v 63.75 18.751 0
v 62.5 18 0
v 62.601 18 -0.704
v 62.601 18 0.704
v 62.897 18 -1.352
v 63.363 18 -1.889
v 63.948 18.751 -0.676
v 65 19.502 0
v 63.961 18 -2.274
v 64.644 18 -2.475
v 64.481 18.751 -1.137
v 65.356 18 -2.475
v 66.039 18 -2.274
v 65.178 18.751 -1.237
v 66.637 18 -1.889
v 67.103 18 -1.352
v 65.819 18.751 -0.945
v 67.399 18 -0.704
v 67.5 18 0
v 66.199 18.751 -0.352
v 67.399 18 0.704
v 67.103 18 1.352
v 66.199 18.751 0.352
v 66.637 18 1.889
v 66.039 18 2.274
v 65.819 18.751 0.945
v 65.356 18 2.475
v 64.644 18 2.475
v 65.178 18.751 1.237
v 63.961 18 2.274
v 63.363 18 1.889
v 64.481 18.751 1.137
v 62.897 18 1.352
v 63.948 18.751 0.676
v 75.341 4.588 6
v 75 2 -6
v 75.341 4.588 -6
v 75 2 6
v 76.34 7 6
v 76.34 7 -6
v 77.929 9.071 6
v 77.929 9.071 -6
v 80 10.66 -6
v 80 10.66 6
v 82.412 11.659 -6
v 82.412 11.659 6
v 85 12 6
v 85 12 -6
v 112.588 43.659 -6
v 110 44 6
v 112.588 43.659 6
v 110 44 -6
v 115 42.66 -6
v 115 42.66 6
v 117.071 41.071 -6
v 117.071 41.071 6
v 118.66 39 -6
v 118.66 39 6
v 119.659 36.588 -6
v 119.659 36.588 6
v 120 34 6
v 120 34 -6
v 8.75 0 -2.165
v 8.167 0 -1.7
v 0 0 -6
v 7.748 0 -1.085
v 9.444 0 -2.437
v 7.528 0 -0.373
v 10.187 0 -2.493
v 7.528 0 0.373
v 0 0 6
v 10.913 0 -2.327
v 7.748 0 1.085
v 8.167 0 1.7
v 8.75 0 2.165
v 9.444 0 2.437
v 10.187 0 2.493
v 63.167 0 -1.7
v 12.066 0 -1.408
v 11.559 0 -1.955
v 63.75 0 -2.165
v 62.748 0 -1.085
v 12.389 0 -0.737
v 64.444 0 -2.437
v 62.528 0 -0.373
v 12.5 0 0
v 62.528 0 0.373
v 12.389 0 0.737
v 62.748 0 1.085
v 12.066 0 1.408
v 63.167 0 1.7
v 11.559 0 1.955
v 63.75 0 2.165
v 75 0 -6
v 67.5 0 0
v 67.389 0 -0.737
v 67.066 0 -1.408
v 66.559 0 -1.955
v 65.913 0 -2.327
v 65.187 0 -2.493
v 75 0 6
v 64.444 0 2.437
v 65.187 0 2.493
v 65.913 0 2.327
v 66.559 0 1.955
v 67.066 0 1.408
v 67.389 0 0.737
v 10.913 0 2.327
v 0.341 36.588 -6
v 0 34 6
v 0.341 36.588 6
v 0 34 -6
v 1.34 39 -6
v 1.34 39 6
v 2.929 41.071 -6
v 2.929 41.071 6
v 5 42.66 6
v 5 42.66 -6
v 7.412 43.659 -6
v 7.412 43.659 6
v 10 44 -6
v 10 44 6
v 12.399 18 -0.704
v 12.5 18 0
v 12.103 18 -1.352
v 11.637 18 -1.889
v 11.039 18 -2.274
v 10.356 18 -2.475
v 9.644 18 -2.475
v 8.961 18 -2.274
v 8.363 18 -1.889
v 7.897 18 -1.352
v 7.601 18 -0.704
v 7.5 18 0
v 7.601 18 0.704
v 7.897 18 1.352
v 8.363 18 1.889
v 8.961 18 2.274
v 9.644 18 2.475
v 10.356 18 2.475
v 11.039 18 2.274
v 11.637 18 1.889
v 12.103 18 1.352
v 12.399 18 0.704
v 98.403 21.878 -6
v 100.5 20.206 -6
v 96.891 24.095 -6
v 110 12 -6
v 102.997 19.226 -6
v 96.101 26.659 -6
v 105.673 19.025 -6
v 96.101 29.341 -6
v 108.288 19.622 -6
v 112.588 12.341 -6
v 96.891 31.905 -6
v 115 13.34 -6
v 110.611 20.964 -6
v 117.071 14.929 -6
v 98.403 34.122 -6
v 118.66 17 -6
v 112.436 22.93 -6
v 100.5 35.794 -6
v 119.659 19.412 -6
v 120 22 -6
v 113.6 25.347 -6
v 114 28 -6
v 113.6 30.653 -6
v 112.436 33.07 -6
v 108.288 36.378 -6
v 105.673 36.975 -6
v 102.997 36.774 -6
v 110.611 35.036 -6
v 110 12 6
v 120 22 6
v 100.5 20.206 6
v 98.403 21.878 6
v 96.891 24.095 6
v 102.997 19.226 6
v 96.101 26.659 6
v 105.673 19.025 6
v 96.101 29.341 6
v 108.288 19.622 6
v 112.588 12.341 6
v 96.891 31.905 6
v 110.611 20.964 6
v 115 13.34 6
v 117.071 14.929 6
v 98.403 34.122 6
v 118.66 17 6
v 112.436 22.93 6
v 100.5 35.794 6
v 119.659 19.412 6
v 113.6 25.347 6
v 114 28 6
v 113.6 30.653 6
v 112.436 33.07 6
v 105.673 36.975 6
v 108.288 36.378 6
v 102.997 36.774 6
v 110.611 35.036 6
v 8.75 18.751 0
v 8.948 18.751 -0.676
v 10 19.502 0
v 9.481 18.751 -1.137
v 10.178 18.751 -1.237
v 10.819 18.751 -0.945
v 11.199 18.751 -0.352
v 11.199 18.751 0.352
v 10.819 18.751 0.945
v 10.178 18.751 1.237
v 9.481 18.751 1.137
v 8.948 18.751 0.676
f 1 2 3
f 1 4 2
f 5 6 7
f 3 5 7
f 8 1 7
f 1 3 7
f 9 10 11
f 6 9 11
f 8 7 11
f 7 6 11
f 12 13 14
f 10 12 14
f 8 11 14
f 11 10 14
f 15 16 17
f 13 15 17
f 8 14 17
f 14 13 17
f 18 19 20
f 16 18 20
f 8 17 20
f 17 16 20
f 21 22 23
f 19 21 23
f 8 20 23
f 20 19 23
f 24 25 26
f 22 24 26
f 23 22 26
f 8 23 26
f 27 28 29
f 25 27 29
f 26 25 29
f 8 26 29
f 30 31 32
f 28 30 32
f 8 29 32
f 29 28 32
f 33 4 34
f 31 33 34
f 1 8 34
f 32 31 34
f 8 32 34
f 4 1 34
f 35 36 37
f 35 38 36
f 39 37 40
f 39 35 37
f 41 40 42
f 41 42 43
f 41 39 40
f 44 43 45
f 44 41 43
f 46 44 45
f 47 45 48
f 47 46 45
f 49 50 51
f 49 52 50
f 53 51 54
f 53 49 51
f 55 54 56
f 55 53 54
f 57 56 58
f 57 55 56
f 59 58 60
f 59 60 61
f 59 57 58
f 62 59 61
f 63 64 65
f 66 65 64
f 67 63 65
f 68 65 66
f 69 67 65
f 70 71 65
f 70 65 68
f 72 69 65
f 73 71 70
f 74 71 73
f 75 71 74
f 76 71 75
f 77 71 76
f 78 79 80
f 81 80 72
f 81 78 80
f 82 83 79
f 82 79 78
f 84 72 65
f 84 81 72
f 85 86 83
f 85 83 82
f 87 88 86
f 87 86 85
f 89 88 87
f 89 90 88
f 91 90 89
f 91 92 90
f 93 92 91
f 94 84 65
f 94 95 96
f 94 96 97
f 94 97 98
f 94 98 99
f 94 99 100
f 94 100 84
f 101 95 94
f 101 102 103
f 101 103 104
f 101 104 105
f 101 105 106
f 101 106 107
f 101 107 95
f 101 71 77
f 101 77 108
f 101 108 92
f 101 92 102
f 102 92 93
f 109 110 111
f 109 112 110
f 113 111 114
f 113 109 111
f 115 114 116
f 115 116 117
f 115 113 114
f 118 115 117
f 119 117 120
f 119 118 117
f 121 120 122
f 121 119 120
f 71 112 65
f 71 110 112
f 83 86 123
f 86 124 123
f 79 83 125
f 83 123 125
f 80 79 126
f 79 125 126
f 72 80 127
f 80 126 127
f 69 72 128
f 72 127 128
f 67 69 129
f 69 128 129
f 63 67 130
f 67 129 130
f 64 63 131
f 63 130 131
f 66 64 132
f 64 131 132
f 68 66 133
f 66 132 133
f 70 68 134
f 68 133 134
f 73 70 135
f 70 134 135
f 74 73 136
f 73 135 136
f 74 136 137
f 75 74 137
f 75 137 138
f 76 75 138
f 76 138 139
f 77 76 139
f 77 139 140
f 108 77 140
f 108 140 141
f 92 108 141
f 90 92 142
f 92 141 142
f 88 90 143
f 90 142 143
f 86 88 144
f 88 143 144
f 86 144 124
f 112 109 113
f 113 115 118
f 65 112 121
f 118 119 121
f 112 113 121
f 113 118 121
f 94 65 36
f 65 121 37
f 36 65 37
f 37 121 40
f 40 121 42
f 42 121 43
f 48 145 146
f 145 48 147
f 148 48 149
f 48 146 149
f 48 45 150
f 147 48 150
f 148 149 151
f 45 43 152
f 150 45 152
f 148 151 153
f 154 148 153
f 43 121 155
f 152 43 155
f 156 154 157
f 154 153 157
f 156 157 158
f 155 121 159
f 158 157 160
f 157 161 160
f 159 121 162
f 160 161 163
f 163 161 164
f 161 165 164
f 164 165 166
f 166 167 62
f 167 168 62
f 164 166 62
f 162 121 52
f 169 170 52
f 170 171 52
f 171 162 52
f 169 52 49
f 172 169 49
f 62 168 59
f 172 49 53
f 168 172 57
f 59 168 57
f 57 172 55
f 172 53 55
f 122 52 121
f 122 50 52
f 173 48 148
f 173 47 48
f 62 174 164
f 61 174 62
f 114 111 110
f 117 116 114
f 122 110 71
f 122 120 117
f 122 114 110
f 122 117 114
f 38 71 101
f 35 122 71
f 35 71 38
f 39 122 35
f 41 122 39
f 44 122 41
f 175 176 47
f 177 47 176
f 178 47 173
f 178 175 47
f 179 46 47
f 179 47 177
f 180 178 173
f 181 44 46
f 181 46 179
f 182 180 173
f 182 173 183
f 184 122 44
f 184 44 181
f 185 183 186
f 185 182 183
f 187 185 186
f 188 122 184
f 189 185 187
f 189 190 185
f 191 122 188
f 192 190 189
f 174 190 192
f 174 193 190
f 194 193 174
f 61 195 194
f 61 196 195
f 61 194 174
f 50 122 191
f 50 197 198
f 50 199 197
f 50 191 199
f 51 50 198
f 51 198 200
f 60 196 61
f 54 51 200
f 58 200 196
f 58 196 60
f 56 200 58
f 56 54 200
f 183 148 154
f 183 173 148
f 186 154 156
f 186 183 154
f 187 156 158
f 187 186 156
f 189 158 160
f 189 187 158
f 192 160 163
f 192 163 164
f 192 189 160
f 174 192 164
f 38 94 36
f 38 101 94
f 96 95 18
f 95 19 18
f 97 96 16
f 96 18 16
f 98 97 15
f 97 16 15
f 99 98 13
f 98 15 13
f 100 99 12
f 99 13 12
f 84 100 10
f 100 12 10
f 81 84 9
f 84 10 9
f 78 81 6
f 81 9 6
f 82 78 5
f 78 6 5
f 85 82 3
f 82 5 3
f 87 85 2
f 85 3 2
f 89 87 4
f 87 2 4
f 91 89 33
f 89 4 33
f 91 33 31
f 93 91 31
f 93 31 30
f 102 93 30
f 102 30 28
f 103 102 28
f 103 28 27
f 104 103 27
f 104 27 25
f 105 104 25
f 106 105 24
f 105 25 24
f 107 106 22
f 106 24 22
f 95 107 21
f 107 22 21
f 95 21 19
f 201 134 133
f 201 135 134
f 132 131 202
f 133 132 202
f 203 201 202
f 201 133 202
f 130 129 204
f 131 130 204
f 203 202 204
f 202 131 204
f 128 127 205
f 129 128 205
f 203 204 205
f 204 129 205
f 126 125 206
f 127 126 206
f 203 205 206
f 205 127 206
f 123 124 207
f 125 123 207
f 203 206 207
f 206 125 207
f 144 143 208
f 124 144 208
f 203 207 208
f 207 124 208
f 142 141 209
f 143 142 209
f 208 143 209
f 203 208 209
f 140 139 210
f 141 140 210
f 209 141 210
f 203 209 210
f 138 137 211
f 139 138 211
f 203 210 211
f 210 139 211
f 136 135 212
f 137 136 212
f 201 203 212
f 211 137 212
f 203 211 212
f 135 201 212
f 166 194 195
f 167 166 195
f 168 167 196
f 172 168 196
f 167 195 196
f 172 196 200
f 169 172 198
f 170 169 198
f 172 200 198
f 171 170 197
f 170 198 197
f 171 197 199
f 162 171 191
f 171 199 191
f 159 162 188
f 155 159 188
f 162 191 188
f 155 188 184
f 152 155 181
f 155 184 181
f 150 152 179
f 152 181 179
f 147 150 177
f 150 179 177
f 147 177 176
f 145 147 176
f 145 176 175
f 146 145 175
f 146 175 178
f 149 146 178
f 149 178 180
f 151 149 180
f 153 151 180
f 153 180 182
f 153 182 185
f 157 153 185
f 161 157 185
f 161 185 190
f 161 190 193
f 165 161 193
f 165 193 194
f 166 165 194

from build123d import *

# Parameters (mm, degrees)
EXTRUDE_1_DEPTH        = 6
HOLE_WIZARD_M6_1_D     = 5
HOLE_WIZARD_M6_1_DEPTH = 18
HOLE_WIZARD_M6_1_TIP   = 1.502151548
SKETCH_4_R             = 9
CUT_EXTRUDE_1_DEPTH    = 13
FILLET_1_R             = 10


with BuildPart() as part:
    # 草图1 → 凸台-拉伸1 (new body, symmetric)
    with BuildSketch(Plane.XY):
        Polygon((0, 0), (75, 0), (75, 12), (120, 12), (120, 44), (0, 44), align=None)
    extrude(amount=EXTRUDE_1_DEPTH, both=True)

    # M6 螺纹孔1
    with Locations(Plane(origin=(0, 0, 0), x_dir=(-1, 0, 0), z_dir=(0, -1, 0))):
        with Locations((-10, 0), (-65, 0)):
            Hole(HOLE_WIZARD_M6_1_D / 2, depth=HOLE_WIZARD_M6_1_DEPTH)
            with Locations((0, 0, -(HOLE_WIZARD_M6_1_DEPTH + HOLE_WIZARD_M6_1_TIP / 2))):  # 118° drill point
                Cone(0, HOLE_WIZARD_M6_1_D / 2, HOLE_WIZARD_M6_1_TIP, mode=Mode.SUBTRACT)

    # 草图4 → 切除-拉伸1 (cut, through all)
    with BuildSketch(Plane.XY.offset(6)):
        with Locations((105, 28)):
            Circle(SKETCH_4_R)
    extrude(amount=-CUT_EXTRUDE_1_DEPTH, mode=Mode.SUBTRACT)

    # 圆角1
    fillet_1_edges = [part.edges().sort_by_distance(p)[0] for p in [
        (0, 44, 0),
        (120, 44, 0),
        (120, 12, 0),
        (75, 12, 0),
    ]]
    fillet(fillet_1_edges, radius=FILLET_1_R)


solid = part.part
